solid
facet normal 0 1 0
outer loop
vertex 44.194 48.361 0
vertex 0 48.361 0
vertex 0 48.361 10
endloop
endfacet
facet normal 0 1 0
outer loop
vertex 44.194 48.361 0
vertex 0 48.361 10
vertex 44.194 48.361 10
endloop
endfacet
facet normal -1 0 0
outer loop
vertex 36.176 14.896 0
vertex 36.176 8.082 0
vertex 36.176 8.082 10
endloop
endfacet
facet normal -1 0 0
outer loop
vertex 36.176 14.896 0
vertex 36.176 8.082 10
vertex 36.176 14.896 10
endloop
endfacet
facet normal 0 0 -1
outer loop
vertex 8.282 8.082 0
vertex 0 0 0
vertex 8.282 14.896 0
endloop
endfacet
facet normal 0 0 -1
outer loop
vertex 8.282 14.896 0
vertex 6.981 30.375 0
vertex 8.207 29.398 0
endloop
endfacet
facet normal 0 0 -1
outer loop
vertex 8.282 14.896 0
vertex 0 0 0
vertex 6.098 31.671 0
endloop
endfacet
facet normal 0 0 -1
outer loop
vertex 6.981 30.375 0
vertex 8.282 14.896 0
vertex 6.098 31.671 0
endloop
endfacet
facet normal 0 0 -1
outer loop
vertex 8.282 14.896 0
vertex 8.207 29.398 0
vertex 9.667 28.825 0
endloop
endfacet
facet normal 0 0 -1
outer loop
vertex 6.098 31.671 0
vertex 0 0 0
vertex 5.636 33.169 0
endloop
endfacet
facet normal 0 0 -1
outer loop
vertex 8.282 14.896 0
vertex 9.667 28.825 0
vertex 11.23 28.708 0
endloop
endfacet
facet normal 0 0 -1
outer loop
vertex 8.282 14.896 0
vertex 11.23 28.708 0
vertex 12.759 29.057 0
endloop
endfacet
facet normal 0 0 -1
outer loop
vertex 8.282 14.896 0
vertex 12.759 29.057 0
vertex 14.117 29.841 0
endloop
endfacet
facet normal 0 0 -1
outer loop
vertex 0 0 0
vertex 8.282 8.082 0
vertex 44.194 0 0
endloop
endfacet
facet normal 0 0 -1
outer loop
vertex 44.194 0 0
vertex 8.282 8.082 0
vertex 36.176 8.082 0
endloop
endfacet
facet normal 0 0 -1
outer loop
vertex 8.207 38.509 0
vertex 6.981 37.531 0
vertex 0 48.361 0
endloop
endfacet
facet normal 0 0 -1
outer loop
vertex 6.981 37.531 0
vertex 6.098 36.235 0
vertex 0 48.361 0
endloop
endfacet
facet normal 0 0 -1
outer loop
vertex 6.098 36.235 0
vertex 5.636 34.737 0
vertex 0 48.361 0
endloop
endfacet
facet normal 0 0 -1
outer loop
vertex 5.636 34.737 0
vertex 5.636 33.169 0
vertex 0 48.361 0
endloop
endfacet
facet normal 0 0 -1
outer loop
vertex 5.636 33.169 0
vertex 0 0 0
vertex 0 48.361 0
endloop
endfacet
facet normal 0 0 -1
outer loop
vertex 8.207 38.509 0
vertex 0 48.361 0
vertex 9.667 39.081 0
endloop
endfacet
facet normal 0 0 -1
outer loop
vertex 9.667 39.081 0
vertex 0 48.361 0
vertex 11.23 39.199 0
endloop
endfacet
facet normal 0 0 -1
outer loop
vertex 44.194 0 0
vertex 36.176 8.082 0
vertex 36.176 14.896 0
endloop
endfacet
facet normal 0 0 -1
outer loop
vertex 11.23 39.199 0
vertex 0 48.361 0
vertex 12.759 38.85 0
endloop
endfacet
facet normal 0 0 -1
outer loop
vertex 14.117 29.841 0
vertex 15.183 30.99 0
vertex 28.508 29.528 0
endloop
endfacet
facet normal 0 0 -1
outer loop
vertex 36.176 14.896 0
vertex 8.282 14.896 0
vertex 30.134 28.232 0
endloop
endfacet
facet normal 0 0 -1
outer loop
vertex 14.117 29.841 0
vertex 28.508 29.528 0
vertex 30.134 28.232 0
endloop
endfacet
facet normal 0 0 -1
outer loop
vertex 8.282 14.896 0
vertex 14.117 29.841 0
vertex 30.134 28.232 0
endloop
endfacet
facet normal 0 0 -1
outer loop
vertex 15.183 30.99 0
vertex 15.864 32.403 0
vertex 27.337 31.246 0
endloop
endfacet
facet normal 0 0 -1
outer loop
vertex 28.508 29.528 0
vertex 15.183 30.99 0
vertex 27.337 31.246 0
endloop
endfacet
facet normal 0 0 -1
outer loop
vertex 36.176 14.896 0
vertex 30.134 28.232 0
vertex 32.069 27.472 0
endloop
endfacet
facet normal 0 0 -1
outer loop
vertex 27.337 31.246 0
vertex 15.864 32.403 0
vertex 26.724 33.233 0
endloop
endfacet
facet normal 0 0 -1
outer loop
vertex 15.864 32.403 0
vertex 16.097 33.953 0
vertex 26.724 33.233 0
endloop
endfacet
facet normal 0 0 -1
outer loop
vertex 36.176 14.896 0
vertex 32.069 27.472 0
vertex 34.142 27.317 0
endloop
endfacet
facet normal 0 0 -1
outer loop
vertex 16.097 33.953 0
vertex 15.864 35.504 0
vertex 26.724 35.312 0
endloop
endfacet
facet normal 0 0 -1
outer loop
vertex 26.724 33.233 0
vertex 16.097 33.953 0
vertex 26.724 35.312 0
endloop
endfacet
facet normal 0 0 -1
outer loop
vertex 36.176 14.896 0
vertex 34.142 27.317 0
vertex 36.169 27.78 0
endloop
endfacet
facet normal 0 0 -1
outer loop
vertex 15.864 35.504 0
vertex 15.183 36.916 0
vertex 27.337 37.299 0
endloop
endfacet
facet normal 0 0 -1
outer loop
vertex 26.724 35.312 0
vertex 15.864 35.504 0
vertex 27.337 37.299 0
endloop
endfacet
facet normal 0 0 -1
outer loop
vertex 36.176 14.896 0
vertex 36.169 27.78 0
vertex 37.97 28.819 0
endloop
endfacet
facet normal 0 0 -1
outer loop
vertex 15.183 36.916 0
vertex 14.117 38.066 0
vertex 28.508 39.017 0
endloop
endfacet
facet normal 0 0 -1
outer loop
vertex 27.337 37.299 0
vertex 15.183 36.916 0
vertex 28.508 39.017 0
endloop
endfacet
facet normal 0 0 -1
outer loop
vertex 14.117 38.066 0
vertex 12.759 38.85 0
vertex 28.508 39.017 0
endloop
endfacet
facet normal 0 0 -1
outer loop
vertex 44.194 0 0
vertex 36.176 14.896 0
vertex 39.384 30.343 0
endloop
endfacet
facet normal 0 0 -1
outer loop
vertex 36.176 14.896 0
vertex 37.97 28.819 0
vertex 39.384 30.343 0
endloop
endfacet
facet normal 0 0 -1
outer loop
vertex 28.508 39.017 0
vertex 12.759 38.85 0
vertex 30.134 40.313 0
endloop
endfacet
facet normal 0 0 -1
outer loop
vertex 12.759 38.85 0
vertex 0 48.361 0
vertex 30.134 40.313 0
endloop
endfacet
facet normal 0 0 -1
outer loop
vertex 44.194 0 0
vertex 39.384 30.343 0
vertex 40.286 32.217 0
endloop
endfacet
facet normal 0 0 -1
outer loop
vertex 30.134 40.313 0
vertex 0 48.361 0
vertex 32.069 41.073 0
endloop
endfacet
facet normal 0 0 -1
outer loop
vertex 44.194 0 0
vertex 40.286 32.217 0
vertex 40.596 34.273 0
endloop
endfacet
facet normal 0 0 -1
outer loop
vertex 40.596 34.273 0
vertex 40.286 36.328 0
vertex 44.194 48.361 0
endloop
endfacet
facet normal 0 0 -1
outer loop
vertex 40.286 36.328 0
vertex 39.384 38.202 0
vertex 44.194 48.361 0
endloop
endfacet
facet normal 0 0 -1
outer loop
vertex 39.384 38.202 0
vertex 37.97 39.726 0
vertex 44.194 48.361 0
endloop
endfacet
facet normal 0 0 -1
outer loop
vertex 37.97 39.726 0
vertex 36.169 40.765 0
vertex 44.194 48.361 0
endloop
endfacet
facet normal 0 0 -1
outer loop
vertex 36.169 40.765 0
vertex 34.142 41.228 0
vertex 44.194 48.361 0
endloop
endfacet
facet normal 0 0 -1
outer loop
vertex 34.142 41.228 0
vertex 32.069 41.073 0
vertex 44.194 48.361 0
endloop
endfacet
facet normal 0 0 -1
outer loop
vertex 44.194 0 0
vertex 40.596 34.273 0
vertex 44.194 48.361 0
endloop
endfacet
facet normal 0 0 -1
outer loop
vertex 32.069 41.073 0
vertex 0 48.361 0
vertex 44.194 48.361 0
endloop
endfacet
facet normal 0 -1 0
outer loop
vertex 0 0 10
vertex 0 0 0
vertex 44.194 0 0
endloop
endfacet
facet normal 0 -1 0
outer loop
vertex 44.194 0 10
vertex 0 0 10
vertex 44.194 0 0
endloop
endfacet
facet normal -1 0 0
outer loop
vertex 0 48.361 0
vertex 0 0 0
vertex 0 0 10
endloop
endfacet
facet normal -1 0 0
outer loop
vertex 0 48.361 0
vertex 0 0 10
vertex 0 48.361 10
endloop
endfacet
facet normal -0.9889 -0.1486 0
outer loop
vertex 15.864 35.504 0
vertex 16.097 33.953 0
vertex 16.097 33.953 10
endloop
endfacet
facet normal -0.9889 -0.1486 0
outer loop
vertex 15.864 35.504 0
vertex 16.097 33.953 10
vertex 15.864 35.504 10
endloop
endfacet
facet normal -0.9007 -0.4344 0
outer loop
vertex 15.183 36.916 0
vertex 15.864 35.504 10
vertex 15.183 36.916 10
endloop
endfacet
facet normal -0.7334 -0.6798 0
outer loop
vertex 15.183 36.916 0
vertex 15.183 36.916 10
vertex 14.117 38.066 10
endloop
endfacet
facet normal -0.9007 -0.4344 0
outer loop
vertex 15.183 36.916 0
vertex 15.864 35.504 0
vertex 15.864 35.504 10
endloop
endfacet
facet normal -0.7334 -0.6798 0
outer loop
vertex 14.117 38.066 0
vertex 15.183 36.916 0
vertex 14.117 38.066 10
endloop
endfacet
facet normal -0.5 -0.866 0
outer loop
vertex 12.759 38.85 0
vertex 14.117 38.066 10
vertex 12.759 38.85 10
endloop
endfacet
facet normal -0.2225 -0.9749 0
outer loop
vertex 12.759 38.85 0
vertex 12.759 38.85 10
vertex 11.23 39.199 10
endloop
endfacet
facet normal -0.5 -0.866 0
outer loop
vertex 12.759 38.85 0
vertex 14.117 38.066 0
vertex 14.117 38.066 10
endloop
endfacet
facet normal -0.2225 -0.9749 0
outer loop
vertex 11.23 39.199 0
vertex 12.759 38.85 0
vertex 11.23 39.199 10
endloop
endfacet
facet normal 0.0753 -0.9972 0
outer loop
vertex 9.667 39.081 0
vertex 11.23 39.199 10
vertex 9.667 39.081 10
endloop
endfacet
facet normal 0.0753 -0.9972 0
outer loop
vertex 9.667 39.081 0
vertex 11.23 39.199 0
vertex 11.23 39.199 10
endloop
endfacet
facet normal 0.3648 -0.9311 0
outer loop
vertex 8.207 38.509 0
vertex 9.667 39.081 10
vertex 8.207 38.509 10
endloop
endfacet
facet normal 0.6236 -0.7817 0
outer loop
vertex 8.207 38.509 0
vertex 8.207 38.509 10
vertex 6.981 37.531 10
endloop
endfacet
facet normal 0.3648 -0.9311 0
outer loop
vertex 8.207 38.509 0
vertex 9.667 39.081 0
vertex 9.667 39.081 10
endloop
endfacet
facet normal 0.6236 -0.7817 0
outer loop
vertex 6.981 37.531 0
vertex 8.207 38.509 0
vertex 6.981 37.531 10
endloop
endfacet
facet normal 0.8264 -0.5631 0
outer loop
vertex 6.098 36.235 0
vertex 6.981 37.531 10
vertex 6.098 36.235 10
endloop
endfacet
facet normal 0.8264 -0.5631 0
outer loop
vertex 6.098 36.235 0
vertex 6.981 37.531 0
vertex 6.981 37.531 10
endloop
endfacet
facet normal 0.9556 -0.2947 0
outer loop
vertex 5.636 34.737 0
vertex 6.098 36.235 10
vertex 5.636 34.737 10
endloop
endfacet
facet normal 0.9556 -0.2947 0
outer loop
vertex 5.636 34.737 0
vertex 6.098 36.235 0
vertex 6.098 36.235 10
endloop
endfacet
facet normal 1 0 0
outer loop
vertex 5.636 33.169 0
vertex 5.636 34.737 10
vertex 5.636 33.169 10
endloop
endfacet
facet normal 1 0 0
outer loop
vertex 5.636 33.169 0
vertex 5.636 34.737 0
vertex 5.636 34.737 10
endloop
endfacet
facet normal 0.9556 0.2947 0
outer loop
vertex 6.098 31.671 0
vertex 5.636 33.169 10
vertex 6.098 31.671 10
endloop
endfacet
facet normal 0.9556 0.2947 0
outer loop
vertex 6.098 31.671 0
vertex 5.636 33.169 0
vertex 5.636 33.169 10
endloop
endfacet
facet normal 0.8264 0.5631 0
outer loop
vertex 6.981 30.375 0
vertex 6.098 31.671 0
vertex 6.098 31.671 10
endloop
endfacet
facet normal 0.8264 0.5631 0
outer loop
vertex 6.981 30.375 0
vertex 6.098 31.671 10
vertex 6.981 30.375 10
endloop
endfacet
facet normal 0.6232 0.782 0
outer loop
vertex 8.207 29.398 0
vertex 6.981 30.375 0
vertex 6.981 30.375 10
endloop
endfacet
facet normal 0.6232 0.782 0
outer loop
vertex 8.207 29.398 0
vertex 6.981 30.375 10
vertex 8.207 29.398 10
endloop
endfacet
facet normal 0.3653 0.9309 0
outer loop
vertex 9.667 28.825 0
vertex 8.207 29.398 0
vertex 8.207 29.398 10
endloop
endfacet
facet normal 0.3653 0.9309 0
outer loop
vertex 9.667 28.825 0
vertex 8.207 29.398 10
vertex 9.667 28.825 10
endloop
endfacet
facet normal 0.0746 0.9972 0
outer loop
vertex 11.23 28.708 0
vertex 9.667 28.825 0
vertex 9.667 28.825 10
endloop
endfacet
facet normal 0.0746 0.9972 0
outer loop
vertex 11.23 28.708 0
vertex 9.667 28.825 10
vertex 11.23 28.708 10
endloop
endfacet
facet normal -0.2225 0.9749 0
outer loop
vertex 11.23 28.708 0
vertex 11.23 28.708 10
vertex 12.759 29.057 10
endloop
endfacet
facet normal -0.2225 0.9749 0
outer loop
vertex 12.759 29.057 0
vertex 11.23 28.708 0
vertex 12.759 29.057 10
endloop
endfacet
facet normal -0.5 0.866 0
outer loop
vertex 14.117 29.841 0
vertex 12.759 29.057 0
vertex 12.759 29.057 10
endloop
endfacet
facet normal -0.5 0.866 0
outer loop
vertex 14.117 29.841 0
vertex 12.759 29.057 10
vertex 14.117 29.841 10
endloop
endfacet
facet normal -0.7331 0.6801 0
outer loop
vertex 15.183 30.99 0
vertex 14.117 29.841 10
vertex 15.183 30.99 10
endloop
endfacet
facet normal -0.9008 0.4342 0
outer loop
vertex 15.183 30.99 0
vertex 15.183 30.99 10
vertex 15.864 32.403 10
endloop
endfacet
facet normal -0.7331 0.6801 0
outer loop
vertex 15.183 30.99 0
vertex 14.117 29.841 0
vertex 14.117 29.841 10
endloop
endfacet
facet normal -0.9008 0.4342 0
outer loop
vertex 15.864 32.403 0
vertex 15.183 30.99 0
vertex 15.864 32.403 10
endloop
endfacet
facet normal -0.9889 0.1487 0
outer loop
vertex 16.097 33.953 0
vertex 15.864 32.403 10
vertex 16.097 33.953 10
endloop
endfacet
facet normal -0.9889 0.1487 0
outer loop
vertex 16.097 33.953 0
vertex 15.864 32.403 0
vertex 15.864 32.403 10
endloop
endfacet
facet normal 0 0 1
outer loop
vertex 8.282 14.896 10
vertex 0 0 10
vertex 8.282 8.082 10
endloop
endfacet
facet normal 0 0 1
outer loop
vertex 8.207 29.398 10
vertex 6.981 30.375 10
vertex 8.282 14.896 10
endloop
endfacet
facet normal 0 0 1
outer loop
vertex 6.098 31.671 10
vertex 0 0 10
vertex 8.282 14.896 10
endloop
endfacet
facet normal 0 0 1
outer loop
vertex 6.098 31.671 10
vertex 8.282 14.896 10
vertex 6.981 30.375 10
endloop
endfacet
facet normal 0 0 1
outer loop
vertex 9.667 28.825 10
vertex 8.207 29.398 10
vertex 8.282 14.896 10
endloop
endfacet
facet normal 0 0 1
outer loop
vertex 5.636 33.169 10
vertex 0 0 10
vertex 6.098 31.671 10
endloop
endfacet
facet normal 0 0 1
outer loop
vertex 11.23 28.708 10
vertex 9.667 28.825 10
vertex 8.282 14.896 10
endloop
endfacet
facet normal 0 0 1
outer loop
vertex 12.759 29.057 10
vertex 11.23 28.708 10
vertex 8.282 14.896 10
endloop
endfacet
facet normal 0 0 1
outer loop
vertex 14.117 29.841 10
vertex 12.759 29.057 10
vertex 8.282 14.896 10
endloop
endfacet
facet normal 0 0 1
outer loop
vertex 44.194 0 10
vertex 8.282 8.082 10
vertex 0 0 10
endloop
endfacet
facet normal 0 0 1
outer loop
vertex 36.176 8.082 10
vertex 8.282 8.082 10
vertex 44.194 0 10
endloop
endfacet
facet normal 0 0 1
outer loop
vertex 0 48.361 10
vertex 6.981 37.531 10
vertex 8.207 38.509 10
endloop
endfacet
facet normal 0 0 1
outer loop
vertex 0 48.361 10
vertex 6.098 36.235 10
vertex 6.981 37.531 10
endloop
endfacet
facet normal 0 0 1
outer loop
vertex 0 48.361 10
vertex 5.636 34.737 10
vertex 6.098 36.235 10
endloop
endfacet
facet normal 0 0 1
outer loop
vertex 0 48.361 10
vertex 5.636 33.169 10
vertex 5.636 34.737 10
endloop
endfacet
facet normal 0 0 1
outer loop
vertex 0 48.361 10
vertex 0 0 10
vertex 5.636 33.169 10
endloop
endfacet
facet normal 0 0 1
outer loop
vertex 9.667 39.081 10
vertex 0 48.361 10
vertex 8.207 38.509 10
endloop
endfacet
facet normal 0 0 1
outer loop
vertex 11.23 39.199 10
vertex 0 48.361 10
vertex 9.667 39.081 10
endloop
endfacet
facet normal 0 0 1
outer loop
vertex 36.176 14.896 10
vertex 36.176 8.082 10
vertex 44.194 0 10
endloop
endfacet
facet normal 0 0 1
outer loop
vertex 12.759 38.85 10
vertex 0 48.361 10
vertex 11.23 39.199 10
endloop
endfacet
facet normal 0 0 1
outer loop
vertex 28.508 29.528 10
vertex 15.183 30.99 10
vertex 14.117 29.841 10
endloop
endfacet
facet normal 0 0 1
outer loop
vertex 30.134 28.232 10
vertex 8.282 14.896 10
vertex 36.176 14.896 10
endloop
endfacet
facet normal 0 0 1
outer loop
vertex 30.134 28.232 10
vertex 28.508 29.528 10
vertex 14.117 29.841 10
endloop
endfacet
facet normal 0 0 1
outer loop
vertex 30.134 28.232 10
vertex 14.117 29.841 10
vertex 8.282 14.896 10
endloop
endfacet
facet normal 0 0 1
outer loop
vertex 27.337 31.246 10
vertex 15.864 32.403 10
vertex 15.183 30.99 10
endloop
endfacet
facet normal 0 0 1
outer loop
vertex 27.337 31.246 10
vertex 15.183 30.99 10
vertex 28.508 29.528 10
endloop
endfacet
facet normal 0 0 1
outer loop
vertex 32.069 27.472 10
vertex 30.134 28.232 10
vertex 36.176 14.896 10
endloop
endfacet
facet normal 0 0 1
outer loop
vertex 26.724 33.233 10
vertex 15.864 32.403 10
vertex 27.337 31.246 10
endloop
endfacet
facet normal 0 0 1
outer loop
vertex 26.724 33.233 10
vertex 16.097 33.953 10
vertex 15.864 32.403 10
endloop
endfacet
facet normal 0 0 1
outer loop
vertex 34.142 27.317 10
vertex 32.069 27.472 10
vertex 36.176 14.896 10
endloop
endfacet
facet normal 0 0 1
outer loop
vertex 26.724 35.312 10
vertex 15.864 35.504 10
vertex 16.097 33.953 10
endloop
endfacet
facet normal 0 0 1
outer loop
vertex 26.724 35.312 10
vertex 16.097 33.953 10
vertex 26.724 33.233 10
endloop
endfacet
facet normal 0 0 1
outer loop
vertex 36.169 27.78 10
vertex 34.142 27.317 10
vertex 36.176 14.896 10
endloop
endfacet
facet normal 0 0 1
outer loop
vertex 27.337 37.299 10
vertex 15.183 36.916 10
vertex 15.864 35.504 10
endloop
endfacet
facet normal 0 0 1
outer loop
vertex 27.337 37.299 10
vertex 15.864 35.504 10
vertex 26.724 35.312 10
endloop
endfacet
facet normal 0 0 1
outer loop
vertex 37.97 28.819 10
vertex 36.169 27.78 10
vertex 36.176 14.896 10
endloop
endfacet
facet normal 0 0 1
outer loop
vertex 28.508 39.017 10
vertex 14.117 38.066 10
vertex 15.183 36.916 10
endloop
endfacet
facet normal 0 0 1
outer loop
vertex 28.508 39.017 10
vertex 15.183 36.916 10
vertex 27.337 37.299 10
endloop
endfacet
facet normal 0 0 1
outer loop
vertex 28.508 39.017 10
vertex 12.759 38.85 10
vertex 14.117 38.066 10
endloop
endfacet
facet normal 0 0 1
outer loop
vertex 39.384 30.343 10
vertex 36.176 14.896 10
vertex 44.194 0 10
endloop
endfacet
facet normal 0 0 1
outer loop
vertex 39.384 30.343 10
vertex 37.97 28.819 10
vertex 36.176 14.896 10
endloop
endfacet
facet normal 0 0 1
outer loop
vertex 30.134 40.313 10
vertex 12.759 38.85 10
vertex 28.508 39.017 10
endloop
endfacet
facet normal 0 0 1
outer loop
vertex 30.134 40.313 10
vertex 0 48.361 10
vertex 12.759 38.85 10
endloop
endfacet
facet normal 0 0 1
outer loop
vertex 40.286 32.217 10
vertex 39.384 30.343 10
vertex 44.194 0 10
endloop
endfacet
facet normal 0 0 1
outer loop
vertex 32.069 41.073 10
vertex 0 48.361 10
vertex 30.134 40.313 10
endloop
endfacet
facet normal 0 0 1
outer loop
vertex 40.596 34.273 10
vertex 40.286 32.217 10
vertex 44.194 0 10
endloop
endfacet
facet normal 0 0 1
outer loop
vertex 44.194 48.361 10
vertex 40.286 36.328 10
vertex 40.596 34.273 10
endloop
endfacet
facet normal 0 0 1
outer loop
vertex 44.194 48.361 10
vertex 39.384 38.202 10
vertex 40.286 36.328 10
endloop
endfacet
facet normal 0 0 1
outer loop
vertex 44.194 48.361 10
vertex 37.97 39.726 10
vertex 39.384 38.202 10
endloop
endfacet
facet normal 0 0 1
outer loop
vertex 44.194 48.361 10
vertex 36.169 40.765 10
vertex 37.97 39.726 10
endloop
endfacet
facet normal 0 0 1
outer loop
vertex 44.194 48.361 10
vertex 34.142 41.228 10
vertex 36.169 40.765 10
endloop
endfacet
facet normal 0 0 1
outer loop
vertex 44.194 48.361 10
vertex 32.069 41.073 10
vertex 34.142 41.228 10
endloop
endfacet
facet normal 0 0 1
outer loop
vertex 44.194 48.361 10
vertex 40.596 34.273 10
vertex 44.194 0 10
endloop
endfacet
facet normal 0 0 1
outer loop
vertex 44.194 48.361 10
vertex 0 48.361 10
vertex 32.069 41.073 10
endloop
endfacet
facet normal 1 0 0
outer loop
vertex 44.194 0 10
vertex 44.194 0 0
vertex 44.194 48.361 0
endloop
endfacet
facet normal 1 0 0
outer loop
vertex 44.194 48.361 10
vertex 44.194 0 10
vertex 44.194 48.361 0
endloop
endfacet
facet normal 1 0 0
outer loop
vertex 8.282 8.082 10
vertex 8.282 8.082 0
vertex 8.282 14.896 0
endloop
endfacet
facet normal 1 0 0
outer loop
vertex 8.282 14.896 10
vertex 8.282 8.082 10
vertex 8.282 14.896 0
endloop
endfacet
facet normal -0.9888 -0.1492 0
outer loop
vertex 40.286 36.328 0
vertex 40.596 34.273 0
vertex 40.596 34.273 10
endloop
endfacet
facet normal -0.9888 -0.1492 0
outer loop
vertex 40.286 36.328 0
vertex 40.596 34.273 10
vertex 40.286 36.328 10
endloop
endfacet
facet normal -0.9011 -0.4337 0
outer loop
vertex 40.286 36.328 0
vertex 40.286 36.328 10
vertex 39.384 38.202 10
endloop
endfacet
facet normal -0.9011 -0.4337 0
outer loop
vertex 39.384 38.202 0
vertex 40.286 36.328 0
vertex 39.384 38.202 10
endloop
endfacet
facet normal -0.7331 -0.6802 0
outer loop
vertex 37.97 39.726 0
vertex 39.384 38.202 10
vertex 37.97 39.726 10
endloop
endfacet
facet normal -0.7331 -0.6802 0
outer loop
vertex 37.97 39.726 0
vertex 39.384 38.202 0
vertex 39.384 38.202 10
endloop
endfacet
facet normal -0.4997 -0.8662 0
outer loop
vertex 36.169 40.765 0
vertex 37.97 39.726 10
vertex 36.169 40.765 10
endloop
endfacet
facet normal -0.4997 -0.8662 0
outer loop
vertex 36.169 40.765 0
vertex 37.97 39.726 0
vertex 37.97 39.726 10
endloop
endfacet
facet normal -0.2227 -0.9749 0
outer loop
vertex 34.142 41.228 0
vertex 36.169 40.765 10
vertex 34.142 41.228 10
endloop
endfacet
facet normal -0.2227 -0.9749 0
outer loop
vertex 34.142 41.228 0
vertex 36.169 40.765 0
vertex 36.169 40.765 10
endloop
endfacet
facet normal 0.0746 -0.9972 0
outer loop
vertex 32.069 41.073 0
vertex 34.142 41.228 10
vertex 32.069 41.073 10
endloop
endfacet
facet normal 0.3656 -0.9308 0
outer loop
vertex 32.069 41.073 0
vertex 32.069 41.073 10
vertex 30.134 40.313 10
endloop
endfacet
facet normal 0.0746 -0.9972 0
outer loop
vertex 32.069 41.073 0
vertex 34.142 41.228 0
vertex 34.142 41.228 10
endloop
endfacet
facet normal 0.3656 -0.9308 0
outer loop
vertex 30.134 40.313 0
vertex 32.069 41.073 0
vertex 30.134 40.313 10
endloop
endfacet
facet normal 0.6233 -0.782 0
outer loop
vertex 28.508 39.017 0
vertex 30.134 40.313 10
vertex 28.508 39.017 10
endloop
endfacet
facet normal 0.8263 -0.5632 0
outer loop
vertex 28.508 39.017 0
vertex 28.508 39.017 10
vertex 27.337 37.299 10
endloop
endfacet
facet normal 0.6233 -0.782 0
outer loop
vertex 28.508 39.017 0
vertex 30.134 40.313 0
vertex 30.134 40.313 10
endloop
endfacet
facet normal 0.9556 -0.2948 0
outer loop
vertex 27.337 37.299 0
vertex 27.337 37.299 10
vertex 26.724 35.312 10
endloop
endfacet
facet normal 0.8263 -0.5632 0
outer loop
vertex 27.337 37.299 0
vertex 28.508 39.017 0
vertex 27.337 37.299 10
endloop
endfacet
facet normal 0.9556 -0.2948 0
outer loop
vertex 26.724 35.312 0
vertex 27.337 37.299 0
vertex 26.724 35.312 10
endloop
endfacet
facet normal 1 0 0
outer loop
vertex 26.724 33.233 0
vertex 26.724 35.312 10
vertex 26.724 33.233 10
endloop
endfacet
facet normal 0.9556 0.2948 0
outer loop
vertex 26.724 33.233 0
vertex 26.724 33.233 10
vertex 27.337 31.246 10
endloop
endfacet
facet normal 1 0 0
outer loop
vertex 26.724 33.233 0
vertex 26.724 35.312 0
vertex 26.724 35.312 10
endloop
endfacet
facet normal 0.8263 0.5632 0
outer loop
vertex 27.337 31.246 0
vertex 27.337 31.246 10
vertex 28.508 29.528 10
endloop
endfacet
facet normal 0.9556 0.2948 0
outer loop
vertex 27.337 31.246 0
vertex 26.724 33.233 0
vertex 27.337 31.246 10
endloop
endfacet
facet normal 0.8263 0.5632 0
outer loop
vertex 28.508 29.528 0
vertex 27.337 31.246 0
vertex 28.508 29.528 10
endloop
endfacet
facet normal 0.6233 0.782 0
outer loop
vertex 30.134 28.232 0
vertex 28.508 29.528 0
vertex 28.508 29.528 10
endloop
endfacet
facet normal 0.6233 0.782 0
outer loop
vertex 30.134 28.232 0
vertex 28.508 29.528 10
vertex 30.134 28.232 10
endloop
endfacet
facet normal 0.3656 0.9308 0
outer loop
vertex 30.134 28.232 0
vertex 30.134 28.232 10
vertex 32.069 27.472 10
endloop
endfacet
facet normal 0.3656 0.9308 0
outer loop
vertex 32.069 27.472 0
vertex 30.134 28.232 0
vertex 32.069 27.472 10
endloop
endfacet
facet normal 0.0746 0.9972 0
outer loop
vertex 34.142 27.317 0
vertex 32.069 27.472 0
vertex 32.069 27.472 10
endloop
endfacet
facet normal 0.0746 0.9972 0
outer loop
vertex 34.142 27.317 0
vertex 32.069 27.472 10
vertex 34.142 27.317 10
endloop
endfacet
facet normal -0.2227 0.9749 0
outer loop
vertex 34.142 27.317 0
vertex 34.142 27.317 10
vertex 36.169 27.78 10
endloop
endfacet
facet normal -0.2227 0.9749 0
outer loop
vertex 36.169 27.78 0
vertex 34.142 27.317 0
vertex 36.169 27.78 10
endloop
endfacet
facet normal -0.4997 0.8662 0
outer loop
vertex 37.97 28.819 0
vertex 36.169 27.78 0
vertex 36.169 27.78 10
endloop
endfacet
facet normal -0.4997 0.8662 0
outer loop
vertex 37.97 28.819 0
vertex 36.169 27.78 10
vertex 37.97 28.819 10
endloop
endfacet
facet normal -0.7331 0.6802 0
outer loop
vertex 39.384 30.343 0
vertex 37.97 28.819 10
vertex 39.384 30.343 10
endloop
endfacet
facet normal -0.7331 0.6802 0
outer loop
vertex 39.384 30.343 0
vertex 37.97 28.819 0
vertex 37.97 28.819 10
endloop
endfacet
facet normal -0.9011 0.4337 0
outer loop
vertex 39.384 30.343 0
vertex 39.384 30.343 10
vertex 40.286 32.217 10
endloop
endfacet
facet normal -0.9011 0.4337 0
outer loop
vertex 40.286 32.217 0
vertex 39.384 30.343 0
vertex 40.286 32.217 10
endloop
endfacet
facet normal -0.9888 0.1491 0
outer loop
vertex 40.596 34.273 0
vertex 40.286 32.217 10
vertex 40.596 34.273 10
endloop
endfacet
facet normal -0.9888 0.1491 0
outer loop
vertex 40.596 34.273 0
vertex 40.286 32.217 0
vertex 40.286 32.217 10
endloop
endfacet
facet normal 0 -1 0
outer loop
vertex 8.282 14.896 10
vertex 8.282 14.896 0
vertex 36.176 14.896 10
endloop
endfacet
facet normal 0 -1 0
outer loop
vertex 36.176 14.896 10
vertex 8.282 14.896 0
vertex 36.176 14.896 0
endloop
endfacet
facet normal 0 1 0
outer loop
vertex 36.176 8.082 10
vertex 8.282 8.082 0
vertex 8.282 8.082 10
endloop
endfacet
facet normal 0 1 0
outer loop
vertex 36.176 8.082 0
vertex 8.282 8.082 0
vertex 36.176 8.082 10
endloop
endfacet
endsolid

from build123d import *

# Parameters (mm, degrees)
SKETCH_W      = 44.193939
SKETCH_H      = 48.360676
SKETCH_R      = 6.97501
SKETCH_R_2    = 5.260158
SKETCH_W_2    = 27.894345
SKETCH_H_2    = 6.813885
EXTRUDE_DEPTH = 10


with BuildPart() as part:
    # Sketch → Extrude (new body)
    with BuildSketch(Plane.XY):
        with Locations((22.09697, 24.180338)):
            Rectangle(SKETCH_W, SKETCH_H)
        with Locations((33.621223, 34.272575)):
            Circle(SKETCH_R, mode=Mode.SUBTRACT)
        with Locations((10.837298, 33.953175)):
            Circle(SKETCH_R_2, mode=Mode.SUBTRACT)
        with Locations((22.229264, 11.488646)):
            Rectangle(SKETCH_W_2, SKETCH_H_2, mode=Mode.SUBTRACT)
    extrude(amount=EXTRUDE_DEPTH)


solid = part.part
